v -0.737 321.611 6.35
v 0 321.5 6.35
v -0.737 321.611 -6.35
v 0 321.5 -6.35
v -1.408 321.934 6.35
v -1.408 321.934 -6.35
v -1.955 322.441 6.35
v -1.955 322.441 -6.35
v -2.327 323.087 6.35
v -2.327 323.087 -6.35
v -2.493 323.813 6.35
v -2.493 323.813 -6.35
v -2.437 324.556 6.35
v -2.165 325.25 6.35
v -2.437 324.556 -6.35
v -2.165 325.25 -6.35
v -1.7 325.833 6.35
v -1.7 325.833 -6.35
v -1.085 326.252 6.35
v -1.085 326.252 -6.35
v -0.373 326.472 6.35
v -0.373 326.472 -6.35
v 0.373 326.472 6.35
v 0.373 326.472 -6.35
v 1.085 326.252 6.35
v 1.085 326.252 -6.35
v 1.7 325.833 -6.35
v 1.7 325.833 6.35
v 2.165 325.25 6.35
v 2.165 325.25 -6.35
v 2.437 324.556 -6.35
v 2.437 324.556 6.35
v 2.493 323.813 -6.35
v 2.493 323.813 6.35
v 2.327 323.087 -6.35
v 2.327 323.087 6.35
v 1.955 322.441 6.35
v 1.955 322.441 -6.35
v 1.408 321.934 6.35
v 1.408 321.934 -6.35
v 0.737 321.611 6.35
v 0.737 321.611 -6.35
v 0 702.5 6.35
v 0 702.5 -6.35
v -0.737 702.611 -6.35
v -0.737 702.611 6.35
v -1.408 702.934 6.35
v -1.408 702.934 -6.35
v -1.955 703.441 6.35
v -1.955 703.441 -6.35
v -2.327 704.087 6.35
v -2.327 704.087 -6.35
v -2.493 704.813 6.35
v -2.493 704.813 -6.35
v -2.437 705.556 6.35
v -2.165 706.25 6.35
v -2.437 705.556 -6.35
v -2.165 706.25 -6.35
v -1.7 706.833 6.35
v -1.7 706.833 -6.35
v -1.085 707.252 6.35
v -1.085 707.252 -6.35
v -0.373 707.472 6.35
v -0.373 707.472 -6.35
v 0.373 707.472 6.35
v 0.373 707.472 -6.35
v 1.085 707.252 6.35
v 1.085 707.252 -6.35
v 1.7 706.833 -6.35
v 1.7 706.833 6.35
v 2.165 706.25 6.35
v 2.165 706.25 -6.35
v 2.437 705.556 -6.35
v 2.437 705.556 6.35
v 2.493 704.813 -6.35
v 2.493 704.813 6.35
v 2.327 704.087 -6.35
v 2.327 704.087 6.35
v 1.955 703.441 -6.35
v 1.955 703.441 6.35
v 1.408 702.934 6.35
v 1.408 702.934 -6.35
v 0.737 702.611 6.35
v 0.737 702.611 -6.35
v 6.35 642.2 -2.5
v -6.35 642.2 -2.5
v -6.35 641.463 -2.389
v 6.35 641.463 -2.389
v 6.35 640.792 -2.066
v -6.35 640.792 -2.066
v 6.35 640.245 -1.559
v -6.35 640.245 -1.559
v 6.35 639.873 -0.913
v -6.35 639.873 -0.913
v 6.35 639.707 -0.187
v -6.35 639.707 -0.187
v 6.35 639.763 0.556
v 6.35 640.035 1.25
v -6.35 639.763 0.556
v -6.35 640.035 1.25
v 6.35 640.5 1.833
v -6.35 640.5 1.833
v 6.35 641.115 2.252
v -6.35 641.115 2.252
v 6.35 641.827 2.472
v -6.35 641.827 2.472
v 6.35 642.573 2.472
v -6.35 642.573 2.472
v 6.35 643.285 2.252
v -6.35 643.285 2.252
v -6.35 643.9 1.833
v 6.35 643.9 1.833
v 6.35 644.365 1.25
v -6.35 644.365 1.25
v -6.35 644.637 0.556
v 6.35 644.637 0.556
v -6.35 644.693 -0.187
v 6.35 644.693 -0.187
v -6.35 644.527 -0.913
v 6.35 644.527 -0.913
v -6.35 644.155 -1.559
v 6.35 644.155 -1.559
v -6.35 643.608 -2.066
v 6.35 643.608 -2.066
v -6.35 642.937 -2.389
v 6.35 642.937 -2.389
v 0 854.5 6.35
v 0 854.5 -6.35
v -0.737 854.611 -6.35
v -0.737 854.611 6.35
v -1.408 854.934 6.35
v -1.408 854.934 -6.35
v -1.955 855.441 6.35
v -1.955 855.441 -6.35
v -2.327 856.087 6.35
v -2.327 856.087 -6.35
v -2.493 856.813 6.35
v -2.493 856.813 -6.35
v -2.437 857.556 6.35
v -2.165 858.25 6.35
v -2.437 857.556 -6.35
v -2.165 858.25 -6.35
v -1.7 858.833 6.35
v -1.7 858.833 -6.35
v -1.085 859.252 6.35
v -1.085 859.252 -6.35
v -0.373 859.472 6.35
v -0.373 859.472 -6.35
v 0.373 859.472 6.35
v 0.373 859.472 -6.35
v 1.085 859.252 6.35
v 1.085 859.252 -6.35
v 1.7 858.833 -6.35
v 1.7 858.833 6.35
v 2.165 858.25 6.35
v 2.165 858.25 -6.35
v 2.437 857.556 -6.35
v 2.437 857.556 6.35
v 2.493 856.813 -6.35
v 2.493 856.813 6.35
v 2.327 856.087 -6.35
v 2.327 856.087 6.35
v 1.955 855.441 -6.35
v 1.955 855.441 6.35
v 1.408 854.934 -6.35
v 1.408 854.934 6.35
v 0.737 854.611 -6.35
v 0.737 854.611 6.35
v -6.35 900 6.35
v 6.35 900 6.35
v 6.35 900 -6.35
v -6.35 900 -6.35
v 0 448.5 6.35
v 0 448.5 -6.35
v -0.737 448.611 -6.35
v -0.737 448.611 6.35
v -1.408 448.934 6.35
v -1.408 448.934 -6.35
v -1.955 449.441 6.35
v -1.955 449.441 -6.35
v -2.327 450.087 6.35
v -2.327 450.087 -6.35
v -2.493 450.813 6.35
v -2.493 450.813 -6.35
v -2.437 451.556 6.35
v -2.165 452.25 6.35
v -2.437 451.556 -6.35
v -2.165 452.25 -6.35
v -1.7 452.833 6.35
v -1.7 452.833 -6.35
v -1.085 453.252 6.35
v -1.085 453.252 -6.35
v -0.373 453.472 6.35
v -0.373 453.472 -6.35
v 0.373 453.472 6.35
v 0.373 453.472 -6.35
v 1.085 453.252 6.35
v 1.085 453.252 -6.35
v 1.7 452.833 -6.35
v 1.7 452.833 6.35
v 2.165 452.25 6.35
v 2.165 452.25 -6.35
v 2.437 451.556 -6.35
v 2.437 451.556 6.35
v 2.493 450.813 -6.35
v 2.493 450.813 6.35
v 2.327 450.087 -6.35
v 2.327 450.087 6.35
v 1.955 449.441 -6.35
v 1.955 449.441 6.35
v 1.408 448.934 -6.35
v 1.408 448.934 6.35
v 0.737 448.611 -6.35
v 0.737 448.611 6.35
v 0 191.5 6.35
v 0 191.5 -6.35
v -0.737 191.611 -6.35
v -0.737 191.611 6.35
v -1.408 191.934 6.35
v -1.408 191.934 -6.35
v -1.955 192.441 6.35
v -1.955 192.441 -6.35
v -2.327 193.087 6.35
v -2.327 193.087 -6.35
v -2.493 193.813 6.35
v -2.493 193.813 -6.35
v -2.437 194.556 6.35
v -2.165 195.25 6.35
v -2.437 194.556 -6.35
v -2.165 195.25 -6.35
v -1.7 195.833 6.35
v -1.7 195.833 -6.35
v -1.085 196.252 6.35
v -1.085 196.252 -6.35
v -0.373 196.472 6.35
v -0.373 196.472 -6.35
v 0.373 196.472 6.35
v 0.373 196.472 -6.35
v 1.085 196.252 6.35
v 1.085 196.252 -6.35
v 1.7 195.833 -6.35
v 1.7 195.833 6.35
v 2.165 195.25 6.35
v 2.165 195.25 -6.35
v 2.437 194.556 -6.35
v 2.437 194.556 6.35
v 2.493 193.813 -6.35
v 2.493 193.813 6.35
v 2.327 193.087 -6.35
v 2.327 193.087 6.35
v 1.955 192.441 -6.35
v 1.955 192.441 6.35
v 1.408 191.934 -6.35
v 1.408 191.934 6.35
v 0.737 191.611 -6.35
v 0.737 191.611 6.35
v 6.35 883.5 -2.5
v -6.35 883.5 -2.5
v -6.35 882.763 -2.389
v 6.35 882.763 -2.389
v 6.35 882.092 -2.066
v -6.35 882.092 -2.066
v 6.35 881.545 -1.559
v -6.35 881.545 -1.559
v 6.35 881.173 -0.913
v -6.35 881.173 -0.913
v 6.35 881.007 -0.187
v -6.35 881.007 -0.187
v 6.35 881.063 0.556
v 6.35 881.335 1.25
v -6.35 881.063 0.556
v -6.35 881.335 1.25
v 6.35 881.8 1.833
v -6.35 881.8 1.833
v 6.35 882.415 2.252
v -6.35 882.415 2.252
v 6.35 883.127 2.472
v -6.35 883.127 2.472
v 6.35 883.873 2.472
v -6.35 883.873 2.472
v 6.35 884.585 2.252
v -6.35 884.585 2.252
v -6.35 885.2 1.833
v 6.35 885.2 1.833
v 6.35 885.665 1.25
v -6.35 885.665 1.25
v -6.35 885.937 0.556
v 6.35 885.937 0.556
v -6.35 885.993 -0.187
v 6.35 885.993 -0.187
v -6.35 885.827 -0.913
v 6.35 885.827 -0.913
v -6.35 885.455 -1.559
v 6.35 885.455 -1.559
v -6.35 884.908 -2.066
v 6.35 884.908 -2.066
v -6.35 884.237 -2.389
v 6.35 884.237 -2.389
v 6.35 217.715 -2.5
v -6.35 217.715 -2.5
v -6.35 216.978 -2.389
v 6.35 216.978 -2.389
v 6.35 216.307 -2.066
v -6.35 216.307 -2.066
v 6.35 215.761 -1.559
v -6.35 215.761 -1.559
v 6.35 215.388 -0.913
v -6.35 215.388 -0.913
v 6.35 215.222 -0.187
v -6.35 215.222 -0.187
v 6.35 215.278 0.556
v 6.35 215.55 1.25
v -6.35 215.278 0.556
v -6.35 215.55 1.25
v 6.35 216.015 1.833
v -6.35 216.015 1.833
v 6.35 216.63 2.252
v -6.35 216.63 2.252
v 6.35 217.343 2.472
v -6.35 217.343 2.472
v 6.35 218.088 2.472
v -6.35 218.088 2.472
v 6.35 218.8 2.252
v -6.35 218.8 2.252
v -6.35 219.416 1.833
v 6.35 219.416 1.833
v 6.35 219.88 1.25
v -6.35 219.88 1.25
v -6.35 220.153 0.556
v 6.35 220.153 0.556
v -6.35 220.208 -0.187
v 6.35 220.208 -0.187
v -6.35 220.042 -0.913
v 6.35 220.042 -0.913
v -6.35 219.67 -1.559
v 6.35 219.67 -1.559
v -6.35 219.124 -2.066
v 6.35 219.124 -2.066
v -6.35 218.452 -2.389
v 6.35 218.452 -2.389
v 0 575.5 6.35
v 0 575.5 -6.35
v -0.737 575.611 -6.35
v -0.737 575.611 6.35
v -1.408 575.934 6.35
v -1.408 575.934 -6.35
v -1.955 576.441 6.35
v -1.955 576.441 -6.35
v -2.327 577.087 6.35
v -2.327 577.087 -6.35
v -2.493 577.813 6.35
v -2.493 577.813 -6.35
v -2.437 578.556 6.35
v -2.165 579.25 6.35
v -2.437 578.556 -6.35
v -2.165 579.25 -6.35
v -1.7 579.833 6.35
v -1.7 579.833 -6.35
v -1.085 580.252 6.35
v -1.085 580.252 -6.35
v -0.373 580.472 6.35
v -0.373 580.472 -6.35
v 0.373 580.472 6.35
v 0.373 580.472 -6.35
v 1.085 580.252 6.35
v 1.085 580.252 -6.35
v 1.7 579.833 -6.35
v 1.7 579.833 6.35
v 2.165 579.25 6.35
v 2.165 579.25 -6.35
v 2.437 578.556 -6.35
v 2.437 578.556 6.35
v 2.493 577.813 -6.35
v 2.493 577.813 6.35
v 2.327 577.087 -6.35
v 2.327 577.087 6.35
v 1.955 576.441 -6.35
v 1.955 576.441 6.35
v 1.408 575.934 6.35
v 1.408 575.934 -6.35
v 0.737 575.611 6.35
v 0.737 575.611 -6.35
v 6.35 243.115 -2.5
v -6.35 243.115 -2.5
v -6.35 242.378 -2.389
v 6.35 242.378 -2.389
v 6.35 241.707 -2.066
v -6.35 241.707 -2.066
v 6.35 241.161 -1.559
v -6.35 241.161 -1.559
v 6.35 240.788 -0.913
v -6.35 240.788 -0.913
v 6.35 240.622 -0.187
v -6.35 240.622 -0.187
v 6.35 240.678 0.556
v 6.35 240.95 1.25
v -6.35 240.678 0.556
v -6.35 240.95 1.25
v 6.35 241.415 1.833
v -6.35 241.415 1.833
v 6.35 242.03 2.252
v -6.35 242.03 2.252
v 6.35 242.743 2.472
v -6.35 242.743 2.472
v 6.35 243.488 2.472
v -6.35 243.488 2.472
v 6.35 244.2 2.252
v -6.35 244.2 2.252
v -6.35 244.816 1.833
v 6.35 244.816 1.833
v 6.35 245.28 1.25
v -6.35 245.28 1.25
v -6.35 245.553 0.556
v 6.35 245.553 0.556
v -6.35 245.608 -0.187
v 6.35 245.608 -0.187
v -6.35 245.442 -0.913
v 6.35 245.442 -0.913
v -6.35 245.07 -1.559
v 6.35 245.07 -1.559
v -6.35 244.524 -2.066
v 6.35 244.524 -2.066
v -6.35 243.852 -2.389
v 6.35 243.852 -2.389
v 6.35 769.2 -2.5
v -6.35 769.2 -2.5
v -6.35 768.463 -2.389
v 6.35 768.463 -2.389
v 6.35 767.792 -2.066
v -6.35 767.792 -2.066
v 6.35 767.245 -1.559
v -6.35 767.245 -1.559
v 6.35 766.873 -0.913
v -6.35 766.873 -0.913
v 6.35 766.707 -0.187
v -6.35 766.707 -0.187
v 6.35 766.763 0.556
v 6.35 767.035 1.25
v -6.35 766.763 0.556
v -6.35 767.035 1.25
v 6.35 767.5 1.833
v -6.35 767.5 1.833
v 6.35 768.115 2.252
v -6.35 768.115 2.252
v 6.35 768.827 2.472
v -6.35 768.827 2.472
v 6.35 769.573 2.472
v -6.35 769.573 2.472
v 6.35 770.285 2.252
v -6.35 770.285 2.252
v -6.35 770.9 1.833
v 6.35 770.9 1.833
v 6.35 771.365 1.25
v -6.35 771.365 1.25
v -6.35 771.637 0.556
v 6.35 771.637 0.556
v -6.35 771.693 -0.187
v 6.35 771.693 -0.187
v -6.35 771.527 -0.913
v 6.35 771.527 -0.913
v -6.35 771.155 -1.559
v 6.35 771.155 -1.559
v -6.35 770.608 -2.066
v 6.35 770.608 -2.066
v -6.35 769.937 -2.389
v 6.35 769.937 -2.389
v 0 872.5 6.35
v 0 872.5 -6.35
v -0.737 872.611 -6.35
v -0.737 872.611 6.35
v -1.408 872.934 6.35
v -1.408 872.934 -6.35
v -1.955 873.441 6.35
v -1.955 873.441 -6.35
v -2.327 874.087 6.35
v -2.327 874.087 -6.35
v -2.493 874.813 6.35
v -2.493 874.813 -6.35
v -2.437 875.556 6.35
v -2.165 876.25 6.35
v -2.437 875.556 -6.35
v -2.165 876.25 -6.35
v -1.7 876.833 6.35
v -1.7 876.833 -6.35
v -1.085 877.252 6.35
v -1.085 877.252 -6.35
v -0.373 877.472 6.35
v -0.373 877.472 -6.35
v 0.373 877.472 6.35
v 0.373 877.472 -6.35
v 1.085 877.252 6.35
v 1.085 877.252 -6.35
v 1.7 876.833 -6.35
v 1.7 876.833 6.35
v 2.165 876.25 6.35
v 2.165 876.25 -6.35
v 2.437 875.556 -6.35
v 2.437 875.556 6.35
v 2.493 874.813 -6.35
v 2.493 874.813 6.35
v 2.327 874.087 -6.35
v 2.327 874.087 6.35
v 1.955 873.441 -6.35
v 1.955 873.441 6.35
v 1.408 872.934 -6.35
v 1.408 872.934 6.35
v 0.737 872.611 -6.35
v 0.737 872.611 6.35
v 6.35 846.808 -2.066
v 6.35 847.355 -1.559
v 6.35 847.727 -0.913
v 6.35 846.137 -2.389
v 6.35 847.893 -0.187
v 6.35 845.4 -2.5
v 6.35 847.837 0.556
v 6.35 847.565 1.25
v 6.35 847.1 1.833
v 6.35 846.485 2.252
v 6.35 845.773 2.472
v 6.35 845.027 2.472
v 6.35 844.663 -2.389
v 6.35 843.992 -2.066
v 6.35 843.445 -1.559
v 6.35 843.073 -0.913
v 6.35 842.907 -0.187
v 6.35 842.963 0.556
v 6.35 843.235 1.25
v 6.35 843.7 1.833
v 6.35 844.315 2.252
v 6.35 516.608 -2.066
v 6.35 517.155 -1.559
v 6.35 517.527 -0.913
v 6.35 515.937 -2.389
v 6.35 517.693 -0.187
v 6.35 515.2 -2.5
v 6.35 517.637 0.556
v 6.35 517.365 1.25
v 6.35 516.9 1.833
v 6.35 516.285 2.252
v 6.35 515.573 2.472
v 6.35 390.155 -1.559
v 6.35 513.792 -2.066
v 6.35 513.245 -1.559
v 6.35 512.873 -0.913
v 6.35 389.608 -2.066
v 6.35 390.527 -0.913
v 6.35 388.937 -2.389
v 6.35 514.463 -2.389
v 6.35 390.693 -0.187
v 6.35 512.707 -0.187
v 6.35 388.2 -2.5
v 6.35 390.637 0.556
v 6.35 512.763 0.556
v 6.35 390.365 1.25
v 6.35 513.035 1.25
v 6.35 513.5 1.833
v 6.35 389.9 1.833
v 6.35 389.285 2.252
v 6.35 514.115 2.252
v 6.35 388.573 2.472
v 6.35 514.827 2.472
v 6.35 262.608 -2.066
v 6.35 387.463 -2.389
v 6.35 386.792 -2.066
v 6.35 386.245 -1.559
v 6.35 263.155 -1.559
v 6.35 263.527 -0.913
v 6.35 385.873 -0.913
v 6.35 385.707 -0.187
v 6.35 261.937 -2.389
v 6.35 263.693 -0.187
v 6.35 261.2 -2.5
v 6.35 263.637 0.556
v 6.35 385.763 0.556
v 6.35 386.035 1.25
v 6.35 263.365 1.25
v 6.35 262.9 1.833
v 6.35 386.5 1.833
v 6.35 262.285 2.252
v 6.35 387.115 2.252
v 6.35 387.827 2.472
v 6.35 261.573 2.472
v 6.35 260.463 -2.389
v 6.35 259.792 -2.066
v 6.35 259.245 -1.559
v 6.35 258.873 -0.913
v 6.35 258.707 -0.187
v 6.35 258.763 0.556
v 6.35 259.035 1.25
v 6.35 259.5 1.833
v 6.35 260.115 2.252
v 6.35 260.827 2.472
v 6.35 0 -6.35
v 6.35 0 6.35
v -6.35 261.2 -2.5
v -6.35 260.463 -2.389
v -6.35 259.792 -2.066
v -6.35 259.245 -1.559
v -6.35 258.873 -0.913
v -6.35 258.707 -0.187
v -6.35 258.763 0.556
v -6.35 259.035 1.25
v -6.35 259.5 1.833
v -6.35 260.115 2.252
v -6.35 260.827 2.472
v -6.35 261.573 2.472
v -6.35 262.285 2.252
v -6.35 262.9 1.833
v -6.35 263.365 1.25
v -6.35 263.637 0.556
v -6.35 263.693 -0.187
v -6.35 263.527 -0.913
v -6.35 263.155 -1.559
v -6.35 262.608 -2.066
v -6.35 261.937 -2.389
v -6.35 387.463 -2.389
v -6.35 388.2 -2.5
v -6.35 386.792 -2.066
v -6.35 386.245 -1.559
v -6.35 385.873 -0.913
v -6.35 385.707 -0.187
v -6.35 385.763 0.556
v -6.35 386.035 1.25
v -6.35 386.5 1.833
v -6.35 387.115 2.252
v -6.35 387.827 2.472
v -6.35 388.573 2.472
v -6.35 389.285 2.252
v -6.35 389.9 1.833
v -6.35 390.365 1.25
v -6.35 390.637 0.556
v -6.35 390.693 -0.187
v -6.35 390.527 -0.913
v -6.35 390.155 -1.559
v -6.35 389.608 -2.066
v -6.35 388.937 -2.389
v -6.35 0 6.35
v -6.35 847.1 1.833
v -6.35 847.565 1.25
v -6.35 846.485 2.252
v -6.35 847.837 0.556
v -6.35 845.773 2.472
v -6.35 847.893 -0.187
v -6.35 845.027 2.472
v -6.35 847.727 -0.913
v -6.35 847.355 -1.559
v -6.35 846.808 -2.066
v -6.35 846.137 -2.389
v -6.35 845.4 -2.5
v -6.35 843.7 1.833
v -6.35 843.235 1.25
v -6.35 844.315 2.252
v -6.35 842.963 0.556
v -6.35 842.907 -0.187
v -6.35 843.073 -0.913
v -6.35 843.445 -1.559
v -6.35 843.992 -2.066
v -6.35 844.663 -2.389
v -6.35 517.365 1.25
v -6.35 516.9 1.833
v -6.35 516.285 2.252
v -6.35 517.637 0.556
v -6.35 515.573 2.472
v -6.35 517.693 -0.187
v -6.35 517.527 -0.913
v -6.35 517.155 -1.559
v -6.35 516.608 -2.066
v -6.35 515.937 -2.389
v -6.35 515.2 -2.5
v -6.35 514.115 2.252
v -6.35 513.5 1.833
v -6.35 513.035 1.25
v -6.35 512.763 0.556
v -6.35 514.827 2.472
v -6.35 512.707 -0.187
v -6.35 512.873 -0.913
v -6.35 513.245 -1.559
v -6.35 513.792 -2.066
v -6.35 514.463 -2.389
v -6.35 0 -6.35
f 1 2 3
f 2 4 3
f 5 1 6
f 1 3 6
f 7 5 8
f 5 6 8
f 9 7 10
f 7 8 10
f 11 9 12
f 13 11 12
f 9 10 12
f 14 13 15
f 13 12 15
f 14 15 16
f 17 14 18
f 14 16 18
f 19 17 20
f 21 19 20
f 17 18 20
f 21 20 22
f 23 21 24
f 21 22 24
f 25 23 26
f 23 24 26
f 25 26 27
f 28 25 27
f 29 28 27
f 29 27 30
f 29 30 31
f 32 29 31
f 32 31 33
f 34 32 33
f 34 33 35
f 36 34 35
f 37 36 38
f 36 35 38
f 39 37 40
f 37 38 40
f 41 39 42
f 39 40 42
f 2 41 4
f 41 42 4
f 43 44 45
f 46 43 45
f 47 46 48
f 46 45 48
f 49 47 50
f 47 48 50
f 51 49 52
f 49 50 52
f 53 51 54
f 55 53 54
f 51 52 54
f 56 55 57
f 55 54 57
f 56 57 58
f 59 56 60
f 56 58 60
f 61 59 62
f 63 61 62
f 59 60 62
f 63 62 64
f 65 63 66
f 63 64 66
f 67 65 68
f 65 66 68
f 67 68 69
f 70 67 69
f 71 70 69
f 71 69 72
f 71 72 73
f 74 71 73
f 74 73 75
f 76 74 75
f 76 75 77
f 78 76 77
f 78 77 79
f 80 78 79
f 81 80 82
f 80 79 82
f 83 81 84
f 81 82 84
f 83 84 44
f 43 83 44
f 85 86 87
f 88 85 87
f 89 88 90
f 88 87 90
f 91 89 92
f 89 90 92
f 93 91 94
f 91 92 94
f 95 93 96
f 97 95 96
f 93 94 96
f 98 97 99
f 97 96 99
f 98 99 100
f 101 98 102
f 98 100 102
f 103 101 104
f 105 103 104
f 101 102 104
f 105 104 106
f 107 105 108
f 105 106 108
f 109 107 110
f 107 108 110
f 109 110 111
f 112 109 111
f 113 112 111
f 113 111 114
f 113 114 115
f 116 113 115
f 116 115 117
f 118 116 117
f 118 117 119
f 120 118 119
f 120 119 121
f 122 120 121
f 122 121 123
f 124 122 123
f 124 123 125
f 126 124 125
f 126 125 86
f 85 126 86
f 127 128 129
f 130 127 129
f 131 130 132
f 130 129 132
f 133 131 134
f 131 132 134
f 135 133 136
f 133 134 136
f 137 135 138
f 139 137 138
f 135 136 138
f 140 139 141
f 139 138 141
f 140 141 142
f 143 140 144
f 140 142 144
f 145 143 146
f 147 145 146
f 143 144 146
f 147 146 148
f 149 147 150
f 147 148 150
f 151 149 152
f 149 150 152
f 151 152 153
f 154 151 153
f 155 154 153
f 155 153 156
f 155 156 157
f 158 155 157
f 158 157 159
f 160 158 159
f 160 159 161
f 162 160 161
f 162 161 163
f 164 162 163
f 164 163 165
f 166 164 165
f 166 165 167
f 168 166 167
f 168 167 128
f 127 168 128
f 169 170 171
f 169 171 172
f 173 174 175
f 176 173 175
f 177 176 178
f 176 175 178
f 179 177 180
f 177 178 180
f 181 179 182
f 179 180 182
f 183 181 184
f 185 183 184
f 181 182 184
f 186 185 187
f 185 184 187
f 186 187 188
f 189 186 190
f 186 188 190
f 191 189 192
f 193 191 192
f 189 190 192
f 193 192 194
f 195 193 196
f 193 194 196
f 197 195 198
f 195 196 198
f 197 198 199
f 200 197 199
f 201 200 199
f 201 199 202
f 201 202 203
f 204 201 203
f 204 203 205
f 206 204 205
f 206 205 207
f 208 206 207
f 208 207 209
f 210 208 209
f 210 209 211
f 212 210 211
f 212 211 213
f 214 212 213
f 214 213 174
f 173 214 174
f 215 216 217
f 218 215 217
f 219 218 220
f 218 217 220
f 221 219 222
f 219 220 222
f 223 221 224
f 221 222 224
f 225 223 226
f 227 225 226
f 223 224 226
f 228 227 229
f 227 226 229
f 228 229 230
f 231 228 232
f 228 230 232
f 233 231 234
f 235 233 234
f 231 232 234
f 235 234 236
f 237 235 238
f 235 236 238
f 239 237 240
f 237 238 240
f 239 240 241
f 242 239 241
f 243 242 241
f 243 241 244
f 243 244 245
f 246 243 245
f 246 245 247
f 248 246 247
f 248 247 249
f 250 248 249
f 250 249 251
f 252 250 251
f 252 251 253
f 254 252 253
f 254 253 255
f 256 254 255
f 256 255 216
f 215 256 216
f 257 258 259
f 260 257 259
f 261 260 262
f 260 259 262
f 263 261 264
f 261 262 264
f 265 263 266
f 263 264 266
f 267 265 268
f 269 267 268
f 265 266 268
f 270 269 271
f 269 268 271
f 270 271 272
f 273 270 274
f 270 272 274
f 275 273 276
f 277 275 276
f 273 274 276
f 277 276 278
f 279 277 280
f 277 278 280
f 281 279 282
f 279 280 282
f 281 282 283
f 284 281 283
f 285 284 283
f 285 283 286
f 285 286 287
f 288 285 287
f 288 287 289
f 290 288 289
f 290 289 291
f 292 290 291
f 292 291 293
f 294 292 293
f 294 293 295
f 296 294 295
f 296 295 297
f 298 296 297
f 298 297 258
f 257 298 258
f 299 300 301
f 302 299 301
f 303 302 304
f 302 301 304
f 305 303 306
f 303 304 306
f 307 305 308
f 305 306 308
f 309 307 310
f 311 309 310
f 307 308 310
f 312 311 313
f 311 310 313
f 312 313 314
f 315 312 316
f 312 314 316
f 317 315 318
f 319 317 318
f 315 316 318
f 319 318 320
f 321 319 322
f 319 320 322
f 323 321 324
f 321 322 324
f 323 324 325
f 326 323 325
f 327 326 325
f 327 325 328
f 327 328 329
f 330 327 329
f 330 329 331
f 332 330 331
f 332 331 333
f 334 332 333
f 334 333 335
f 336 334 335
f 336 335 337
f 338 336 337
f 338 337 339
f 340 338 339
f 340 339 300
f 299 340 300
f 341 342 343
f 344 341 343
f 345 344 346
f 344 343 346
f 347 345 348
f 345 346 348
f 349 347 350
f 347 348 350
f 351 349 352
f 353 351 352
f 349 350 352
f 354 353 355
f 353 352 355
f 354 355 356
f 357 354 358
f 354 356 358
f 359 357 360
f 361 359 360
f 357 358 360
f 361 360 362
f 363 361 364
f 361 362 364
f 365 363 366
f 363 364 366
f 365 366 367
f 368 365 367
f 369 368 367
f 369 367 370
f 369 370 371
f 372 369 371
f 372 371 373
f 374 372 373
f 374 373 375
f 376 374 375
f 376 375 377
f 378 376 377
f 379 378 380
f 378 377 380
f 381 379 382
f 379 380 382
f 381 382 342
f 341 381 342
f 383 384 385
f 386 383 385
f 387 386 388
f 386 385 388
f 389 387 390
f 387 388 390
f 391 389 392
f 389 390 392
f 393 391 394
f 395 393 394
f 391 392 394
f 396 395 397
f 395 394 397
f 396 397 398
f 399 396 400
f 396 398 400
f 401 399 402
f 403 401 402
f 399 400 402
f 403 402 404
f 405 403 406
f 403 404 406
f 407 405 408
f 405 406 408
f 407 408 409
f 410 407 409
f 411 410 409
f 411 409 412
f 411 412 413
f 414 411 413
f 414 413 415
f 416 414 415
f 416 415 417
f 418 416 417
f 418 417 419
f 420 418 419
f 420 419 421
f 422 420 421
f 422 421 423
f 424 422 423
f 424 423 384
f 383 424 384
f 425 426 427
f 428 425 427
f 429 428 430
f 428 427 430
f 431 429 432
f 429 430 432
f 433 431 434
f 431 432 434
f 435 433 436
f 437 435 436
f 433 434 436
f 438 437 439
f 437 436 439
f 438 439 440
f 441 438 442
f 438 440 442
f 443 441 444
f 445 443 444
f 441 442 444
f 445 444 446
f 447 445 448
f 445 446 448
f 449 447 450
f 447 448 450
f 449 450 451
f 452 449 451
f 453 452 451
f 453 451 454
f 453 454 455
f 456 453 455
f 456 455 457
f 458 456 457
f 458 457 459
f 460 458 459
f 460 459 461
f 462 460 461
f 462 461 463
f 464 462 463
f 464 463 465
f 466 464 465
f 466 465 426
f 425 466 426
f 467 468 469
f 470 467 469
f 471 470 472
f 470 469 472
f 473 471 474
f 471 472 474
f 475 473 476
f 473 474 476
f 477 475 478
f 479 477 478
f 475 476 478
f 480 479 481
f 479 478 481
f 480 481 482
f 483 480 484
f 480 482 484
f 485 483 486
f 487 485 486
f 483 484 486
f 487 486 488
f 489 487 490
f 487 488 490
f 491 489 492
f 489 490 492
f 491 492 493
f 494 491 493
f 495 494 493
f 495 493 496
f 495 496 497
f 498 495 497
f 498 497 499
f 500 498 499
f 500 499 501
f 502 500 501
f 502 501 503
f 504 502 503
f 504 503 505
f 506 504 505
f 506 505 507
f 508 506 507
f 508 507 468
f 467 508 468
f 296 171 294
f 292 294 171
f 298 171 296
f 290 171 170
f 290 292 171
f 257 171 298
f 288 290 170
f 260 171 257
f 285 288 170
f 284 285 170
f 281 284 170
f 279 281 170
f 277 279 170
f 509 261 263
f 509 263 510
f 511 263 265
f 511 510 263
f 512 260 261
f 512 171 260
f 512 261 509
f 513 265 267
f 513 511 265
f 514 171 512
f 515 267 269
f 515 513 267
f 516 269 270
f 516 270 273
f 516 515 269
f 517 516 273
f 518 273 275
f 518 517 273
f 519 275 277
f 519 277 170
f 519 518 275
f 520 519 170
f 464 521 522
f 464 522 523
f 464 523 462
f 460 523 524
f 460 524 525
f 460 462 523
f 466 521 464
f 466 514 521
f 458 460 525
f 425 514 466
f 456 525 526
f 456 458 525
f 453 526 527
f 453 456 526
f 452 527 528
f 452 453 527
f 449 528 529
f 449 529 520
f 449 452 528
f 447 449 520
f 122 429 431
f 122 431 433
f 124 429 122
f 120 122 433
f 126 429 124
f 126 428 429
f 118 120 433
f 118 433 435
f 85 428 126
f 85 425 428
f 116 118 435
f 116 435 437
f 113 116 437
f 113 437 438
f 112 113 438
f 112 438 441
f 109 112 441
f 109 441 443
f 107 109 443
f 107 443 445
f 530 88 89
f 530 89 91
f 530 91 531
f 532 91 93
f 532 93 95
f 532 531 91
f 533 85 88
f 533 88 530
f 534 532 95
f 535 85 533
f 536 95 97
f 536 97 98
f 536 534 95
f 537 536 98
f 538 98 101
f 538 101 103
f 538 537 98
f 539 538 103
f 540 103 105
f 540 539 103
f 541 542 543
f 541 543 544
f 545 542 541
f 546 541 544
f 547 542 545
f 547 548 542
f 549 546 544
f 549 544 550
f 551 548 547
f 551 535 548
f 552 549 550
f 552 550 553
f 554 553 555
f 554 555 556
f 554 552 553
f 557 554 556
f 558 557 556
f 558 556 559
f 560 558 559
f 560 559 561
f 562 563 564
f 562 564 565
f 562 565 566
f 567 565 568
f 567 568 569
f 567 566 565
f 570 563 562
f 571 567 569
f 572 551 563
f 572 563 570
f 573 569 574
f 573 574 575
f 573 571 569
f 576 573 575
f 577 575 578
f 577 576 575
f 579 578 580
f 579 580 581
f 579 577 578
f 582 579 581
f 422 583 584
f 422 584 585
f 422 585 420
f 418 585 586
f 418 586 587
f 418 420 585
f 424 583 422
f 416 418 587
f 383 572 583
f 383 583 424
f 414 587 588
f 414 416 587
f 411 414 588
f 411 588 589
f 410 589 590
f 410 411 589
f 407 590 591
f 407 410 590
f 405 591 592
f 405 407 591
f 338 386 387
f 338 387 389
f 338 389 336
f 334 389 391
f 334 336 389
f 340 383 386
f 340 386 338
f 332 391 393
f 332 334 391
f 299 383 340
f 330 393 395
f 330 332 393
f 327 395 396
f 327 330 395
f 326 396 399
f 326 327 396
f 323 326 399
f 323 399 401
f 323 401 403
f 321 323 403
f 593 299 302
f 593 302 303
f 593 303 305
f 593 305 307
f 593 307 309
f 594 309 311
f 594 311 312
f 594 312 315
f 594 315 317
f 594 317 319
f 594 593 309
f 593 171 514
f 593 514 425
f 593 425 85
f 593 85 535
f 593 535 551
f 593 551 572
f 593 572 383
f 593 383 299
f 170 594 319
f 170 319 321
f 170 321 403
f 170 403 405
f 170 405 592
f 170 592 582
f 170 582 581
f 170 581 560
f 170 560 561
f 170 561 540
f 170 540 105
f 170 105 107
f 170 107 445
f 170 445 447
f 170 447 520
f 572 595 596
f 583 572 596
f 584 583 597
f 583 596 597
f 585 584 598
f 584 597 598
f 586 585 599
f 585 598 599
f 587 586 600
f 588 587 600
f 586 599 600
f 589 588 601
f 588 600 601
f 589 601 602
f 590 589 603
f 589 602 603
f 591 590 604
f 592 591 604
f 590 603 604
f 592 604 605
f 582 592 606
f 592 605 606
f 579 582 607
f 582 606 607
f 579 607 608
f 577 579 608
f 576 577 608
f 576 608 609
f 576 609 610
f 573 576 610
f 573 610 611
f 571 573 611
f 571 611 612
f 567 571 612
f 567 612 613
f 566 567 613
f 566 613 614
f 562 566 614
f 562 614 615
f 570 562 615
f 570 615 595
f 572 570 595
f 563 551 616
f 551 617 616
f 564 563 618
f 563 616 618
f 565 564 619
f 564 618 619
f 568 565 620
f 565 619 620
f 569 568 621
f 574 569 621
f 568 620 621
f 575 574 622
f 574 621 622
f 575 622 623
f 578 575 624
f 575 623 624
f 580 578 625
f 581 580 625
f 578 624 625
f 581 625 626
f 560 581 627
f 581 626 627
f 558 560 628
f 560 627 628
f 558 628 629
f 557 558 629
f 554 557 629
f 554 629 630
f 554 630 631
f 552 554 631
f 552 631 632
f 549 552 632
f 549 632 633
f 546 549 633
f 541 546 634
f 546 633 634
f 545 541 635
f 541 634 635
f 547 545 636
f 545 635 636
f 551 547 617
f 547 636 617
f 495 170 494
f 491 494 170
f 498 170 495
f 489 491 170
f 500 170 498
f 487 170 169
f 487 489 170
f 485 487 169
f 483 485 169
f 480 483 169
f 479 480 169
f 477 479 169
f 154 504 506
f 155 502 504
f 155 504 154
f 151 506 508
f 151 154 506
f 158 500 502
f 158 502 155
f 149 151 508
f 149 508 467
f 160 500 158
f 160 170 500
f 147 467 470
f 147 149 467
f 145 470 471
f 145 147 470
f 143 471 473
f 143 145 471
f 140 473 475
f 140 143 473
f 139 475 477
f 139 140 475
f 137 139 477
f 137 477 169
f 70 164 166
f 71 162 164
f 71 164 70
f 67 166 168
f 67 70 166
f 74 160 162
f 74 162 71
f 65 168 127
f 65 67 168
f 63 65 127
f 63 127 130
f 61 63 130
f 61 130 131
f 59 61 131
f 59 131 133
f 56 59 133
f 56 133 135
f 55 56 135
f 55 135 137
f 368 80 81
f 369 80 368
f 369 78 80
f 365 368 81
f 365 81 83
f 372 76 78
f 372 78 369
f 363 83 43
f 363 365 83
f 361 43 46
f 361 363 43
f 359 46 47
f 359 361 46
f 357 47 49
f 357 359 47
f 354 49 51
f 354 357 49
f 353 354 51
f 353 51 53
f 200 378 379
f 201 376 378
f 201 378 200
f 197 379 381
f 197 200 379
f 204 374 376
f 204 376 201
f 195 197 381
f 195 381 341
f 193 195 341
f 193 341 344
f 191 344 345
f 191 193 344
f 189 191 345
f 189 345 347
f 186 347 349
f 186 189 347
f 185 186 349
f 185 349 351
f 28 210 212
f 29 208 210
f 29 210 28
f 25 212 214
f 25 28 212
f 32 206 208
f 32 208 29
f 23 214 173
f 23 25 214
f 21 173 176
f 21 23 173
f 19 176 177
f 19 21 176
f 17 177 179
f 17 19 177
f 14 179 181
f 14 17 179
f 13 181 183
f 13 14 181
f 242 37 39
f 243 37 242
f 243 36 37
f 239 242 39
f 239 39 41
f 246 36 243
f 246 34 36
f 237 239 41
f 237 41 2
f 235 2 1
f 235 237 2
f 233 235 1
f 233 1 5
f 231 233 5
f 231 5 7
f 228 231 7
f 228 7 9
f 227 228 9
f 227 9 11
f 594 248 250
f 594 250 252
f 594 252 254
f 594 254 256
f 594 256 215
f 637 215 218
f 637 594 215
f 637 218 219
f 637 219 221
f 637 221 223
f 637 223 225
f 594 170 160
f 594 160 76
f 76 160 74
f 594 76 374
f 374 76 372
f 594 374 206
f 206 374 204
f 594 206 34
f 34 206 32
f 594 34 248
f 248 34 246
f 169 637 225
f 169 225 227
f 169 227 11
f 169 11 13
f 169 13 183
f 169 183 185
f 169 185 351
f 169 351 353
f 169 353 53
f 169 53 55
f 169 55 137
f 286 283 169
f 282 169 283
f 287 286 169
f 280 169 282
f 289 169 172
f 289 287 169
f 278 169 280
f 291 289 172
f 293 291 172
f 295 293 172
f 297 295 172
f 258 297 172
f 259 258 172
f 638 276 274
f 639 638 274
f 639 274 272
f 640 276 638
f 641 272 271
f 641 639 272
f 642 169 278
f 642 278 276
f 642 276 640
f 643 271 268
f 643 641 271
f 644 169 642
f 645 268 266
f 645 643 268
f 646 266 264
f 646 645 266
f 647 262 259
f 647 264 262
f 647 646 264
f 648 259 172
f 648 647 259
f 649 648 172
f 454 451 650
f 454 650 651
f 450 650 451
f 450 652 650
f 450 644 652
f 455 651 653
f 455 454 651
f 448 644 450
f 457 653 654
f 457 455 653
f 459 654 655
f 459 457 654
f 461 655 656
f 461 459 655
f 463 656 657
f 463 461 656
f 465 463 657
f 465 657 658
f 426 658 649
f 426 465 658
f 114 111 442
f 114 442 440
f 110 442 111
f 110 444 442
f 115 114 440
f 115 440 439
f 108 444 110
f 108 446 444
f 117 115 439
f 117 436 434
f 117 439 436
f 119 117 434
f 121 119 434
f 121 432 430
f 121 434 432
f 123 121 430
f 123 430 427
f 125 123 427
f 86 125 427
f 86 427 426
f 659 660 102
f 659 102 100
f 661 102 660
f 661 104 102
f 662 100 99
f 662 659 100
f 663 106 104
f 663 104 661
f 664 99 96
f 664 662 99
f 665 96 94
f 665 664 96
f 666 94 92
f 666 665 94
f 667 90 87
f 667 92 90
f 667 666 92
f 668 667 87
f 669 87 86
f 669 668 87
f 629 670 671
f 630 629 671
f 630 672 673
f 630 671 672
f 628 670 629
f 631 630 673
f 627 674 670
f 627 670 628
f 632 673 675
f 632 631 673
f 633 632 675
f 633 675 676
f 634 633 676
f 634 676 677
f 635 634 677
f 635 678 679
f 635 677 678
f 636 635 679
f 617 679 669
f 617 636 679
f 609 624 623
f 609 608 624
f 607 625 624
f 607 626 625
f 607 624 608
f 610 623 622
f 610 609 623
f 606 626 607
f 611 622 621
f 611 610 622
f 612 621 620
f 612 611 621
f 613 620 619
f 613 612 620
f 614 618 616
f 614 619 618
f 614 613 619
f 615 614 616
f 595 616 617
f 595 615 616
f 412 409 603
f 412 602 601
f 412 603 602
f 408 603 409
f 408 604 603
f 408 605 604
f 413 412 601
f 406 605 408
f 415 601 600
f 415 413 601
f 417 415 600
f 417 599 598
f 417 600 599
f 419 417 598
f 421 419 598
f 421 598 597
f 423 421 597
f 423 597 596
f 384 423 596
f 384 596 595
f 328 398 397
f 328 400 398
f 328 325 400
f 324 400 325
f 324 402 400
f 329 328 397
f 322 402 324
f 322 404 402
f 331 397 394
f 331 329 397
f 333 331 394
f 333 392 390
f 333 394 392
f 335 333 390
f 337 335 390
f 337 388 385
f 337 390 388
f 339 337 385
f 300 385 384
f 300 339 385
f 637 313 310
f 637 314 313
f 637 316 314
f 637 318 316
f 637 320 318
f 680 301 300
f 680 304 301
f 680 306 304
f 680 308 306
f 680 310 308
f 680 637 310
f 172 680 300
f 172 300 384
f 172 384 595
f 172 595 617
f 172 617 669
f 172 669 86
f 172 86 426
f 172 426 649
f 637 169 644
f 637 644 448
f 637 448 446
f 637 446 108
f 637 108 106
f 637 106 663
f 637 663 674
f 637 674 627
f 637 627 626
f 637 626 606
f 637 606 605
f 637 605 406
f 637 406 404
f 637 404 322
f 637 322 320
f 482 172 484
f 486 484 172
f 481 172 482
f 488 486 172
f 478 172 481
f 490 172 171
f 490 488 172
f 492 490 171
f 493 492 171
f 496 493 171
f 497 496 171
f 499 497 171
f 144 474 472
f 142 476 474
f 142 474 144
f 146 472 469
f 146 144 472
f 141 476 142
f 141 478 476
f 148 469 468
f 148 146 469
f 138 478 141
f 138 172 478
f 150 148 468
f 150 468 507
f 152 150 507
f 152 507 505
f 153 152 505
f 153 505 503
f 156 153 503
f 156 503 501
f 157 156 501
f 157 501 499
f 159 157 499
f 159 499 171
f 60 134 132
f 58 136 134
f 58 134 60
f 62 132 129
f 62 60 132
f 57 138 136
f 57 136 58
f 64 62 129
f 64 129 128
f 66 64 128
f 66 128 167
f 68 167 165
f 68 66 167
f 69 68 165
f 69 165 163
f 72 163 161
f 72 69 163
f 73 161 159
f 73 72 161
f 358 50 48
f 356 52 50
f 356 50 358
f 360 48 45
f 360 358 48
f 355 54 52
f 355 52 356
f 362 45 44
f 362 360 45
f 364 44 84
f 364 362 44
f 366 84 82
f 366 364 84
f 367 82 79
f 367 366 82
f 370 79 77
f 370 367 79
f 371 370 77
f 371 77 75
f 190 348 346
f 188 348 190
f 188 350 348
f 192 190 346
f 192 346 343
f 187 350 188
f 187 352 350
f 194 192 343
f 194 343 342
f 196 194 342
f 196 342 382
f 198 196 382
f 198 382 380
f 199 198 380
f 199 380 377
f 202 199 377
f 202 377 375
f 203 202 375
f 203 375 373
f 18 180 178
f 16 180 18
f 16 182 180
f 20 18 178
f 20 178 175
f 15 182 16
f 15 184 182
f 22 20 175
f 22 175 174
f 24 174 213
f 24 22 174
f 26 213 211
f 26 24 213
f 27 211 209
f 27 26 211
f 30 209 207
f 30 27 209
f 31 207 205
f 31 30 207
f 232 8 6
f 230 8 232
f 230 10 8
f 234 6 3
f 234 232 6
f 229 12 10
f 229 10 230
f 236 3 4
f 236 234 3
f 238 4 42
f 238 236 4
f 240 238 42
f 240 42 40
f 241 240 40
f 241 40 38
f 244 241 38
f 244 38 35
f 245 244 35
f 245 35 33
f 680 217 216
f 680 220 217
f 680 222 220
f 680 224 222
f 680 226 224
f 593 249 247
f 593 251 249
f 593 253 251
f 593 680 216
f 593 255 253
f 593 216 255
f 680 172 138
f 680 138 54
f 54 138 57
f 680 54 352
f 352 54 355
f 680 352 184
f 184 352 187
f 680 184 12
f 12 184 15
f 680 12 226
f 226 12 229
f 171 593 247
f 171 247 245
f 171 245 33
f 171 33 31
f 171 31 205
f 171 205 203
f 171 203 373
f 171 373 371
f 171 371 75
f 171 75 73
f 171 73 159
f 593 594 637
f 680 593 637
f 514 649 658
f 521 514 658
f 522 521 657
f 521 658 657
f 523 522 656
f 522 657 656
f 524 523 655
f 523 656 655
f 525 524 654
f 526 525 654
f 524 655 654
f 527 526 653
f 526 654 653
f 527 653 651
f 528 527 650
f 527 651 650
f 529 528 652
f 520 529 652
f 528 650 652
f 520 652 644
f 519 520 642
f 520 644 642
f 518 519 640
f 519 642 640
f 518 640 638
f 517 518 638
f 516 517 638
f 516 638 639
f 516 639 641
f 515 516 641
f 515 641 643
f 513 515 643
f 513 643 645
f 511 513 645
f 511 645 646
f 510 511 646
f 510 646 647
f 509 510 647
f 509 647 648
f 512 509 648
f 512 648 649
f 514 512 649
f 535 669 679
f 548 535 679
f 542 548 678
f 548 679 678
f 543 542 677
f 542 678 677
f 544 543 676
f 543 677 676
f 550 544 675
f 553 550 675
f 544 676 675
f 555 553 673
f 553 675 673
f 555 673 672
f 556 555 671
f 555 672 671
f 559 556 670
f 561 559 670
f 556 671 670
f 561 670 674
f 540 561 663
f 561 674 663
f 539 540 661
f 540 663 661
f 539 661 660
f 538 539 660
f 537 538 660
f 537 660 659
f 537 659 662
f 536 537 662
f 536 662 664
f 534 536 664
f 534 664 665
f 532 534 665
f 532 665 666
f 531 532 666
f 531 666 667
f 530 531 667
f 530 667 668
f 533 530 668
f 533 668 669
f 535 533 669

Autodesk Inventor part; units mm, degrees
ref_plane "YZ Plane" through (0, 0, 0) normal (1, 0, 0) x (0, 1, 0)
ref_plane "XZ Plane" through (0, 0, 0) normal (0, 1, 0) x (-1, 0, 0)
ref_plane "XY Plane" through (0, 0, 0) normal (0, 0, 1) x (1, 0, 0)
sketch "Sketch1" plane through (0, 0, 0) normal (0, 1, 0) x (-1, 0, 0)
  line L0 (-6.35, 6.35) -> (6.35, 6.35)
  line L1 (6.35, 6.35) -> (6.35, -6.35)
  line L2 (6.35, -6.35) -> (-6.35, -6.35)
  line L3 (-6.35, -6.35) -> (-6.35, 6.35)
  line L4 (-6.35, 6.35) -> (6.35, -6.35) construction
  line L5 (6.35, 6.35) -> (-6.35, -6.35) construction
  point P0 (0, 0)
  dimension "d0" = 12.7
  dimension "d1" = 12.7
extrude "Extrusion1" add sketch "Sketch1" along normal blind 900
sketch "Sketch25" plane through (6.35, 0, 6.35) normal (0, 0, 1) x (1, 0, 0)
  circle A0 centre (-6.35, 875) radius 2.5
  line L0 (-12.7, 900) -> (0, 900) projected
  line L1 (0, 0) -> (0, 900) projected
  circle A1 centre (-6.35, 857) radius 2.5
  circle A2 centre (-6.35, 705) radius 2.5
  circle A3 centre (-6.35, 578) radius 2.5
  circle A4 centre (-6.35, 451) radius 2.5
  circle A5 centre (-6.35, 324) radius 2.5
  circle A6 centre (-6.35, 194) radius 2.5
  line L2 (0, 0) -> (-12.7, 0) projected
  point P0 (-6.35, 0)
  dimension "d197" = 5
  dimension "d198" = 25
  dimension "d199" = 6.35
  dimension "d200" = 5
  dimension "d201" = 18
  dimension "d202" = 6.35
  dimension "d210" = 5
  dimension "d211" = 152
  dimension "d212" = 6.35
  dimension "d213" = 5
  dimension "d214" = 127
  dimension "d215" = 5
  dimension "d216" = 127
  dimension "d217" = 5
  dimension "d218" = 127
  dimension "d219" = 5
  dimension "d220" = 130
hole "Hole23" at (0, 875, 6.35) at (0, 857, 6.35) at (0, 705, 6.35) at (0, 578, 6.35) at (0, 451, 6.35) at (0, 324, 6.35) at (0, 194, 6.35) direction (0, 0, -1) diameter 5 end through all
sketch "Sketch26" plane through (6.35, 0, -6.35) normal (1, 0, 0) x (0, 0, -1)
  circle A0 centre (-6.35, 883.5) radius 2.5
  line L0 (-12.7, 900) -> (0, 900) projected
  circle A1 centre (-6.35, 845.4) radius 2.5
  circle A2 centre (-6.35, 769.2) radius 2.5
  circle A3 centre (-6.35, 642.2) radius 2.5
  circle A4 centre (-6.35, 515.2) radius 2.5
  circle A5 centre (-6.35, 388.2) radius 2.5
  circle A6 centre (-6.35, 261.2) radius 2.5
  circle A7 centre (-6.35, 243.1152) radius 2.5
  circle A8 centre (-6.35, 217.7152) radius 2.5
  point P0 (-6.35, 0)
  dimension "d231" = 5
  dimension "d232" = 16.5
  dimension "d233" = 5
  dimension "d234" = 38.1
  dimension "d235" = 5
  dimension "d236" = 76.2
  dimension "d237" = 5
  dimension "d238" = 127
  dimension "d239" = 5
  dimension "d240" = 127
  dimension "d241" = 5
  dimension "d242" = 127
  dimension "d243" = 5
  dimension "d244" = 127
  dimension "d245" = 5
  dimension "d246" = 18.0848
  dimension "d247" = 5
  dimension "d248" = 25.4
hole "Hole24" at (6.35, 883.5, 0) at (6.35, 845.4, 0) at (6.35, 769.2, 0) at (6.35, 642.2, 0) at (6.35, 515.2, 0) at (6.35, 388.2, 0) at (6.35, 261.2, 0) at (6.35, 243.1152, 0) at (6.35, 217.7152, 0) direction (-1, 0, 0) diameter 5 end through all
thread "Thread1" size "M5x0.8" class "6H" standard "ANSI Metric M Profile" full length
thread "Thread2" size "M5x0.8" class "6H" standard "ANSI Metric M Profile" full length
thread "Thread3" size "M5x0.8" class "6H" standard "ANSI Metric M Profile" full length
thread "Thread4" size "M5x0.8" class "6H" standard "ANSI Metric M Profile" full length
thread "Thread5" size "M5x0.8" class "6H" standard "ANSI Metric M Profile" full length
thread "Thread6" size "M5x0.8" class "6H" standard "ANSI Metric M Profile" full length
thread "Thread7" size "M5x0.8" class "6H" standard "ANSI Metric M Profile" full length
thread "Thread8" size "M5x0.8" class "6H" standard "ANSI Metric M Profile" full length
thread "Thread9" size "M5x0.8" class "6H" standard "ANSI Metric M Profile" full length
thread "Thread10" size "M5x0.8" class "6H" standard "ANSI Metric M Profile" full length
properties part number "Rod"
